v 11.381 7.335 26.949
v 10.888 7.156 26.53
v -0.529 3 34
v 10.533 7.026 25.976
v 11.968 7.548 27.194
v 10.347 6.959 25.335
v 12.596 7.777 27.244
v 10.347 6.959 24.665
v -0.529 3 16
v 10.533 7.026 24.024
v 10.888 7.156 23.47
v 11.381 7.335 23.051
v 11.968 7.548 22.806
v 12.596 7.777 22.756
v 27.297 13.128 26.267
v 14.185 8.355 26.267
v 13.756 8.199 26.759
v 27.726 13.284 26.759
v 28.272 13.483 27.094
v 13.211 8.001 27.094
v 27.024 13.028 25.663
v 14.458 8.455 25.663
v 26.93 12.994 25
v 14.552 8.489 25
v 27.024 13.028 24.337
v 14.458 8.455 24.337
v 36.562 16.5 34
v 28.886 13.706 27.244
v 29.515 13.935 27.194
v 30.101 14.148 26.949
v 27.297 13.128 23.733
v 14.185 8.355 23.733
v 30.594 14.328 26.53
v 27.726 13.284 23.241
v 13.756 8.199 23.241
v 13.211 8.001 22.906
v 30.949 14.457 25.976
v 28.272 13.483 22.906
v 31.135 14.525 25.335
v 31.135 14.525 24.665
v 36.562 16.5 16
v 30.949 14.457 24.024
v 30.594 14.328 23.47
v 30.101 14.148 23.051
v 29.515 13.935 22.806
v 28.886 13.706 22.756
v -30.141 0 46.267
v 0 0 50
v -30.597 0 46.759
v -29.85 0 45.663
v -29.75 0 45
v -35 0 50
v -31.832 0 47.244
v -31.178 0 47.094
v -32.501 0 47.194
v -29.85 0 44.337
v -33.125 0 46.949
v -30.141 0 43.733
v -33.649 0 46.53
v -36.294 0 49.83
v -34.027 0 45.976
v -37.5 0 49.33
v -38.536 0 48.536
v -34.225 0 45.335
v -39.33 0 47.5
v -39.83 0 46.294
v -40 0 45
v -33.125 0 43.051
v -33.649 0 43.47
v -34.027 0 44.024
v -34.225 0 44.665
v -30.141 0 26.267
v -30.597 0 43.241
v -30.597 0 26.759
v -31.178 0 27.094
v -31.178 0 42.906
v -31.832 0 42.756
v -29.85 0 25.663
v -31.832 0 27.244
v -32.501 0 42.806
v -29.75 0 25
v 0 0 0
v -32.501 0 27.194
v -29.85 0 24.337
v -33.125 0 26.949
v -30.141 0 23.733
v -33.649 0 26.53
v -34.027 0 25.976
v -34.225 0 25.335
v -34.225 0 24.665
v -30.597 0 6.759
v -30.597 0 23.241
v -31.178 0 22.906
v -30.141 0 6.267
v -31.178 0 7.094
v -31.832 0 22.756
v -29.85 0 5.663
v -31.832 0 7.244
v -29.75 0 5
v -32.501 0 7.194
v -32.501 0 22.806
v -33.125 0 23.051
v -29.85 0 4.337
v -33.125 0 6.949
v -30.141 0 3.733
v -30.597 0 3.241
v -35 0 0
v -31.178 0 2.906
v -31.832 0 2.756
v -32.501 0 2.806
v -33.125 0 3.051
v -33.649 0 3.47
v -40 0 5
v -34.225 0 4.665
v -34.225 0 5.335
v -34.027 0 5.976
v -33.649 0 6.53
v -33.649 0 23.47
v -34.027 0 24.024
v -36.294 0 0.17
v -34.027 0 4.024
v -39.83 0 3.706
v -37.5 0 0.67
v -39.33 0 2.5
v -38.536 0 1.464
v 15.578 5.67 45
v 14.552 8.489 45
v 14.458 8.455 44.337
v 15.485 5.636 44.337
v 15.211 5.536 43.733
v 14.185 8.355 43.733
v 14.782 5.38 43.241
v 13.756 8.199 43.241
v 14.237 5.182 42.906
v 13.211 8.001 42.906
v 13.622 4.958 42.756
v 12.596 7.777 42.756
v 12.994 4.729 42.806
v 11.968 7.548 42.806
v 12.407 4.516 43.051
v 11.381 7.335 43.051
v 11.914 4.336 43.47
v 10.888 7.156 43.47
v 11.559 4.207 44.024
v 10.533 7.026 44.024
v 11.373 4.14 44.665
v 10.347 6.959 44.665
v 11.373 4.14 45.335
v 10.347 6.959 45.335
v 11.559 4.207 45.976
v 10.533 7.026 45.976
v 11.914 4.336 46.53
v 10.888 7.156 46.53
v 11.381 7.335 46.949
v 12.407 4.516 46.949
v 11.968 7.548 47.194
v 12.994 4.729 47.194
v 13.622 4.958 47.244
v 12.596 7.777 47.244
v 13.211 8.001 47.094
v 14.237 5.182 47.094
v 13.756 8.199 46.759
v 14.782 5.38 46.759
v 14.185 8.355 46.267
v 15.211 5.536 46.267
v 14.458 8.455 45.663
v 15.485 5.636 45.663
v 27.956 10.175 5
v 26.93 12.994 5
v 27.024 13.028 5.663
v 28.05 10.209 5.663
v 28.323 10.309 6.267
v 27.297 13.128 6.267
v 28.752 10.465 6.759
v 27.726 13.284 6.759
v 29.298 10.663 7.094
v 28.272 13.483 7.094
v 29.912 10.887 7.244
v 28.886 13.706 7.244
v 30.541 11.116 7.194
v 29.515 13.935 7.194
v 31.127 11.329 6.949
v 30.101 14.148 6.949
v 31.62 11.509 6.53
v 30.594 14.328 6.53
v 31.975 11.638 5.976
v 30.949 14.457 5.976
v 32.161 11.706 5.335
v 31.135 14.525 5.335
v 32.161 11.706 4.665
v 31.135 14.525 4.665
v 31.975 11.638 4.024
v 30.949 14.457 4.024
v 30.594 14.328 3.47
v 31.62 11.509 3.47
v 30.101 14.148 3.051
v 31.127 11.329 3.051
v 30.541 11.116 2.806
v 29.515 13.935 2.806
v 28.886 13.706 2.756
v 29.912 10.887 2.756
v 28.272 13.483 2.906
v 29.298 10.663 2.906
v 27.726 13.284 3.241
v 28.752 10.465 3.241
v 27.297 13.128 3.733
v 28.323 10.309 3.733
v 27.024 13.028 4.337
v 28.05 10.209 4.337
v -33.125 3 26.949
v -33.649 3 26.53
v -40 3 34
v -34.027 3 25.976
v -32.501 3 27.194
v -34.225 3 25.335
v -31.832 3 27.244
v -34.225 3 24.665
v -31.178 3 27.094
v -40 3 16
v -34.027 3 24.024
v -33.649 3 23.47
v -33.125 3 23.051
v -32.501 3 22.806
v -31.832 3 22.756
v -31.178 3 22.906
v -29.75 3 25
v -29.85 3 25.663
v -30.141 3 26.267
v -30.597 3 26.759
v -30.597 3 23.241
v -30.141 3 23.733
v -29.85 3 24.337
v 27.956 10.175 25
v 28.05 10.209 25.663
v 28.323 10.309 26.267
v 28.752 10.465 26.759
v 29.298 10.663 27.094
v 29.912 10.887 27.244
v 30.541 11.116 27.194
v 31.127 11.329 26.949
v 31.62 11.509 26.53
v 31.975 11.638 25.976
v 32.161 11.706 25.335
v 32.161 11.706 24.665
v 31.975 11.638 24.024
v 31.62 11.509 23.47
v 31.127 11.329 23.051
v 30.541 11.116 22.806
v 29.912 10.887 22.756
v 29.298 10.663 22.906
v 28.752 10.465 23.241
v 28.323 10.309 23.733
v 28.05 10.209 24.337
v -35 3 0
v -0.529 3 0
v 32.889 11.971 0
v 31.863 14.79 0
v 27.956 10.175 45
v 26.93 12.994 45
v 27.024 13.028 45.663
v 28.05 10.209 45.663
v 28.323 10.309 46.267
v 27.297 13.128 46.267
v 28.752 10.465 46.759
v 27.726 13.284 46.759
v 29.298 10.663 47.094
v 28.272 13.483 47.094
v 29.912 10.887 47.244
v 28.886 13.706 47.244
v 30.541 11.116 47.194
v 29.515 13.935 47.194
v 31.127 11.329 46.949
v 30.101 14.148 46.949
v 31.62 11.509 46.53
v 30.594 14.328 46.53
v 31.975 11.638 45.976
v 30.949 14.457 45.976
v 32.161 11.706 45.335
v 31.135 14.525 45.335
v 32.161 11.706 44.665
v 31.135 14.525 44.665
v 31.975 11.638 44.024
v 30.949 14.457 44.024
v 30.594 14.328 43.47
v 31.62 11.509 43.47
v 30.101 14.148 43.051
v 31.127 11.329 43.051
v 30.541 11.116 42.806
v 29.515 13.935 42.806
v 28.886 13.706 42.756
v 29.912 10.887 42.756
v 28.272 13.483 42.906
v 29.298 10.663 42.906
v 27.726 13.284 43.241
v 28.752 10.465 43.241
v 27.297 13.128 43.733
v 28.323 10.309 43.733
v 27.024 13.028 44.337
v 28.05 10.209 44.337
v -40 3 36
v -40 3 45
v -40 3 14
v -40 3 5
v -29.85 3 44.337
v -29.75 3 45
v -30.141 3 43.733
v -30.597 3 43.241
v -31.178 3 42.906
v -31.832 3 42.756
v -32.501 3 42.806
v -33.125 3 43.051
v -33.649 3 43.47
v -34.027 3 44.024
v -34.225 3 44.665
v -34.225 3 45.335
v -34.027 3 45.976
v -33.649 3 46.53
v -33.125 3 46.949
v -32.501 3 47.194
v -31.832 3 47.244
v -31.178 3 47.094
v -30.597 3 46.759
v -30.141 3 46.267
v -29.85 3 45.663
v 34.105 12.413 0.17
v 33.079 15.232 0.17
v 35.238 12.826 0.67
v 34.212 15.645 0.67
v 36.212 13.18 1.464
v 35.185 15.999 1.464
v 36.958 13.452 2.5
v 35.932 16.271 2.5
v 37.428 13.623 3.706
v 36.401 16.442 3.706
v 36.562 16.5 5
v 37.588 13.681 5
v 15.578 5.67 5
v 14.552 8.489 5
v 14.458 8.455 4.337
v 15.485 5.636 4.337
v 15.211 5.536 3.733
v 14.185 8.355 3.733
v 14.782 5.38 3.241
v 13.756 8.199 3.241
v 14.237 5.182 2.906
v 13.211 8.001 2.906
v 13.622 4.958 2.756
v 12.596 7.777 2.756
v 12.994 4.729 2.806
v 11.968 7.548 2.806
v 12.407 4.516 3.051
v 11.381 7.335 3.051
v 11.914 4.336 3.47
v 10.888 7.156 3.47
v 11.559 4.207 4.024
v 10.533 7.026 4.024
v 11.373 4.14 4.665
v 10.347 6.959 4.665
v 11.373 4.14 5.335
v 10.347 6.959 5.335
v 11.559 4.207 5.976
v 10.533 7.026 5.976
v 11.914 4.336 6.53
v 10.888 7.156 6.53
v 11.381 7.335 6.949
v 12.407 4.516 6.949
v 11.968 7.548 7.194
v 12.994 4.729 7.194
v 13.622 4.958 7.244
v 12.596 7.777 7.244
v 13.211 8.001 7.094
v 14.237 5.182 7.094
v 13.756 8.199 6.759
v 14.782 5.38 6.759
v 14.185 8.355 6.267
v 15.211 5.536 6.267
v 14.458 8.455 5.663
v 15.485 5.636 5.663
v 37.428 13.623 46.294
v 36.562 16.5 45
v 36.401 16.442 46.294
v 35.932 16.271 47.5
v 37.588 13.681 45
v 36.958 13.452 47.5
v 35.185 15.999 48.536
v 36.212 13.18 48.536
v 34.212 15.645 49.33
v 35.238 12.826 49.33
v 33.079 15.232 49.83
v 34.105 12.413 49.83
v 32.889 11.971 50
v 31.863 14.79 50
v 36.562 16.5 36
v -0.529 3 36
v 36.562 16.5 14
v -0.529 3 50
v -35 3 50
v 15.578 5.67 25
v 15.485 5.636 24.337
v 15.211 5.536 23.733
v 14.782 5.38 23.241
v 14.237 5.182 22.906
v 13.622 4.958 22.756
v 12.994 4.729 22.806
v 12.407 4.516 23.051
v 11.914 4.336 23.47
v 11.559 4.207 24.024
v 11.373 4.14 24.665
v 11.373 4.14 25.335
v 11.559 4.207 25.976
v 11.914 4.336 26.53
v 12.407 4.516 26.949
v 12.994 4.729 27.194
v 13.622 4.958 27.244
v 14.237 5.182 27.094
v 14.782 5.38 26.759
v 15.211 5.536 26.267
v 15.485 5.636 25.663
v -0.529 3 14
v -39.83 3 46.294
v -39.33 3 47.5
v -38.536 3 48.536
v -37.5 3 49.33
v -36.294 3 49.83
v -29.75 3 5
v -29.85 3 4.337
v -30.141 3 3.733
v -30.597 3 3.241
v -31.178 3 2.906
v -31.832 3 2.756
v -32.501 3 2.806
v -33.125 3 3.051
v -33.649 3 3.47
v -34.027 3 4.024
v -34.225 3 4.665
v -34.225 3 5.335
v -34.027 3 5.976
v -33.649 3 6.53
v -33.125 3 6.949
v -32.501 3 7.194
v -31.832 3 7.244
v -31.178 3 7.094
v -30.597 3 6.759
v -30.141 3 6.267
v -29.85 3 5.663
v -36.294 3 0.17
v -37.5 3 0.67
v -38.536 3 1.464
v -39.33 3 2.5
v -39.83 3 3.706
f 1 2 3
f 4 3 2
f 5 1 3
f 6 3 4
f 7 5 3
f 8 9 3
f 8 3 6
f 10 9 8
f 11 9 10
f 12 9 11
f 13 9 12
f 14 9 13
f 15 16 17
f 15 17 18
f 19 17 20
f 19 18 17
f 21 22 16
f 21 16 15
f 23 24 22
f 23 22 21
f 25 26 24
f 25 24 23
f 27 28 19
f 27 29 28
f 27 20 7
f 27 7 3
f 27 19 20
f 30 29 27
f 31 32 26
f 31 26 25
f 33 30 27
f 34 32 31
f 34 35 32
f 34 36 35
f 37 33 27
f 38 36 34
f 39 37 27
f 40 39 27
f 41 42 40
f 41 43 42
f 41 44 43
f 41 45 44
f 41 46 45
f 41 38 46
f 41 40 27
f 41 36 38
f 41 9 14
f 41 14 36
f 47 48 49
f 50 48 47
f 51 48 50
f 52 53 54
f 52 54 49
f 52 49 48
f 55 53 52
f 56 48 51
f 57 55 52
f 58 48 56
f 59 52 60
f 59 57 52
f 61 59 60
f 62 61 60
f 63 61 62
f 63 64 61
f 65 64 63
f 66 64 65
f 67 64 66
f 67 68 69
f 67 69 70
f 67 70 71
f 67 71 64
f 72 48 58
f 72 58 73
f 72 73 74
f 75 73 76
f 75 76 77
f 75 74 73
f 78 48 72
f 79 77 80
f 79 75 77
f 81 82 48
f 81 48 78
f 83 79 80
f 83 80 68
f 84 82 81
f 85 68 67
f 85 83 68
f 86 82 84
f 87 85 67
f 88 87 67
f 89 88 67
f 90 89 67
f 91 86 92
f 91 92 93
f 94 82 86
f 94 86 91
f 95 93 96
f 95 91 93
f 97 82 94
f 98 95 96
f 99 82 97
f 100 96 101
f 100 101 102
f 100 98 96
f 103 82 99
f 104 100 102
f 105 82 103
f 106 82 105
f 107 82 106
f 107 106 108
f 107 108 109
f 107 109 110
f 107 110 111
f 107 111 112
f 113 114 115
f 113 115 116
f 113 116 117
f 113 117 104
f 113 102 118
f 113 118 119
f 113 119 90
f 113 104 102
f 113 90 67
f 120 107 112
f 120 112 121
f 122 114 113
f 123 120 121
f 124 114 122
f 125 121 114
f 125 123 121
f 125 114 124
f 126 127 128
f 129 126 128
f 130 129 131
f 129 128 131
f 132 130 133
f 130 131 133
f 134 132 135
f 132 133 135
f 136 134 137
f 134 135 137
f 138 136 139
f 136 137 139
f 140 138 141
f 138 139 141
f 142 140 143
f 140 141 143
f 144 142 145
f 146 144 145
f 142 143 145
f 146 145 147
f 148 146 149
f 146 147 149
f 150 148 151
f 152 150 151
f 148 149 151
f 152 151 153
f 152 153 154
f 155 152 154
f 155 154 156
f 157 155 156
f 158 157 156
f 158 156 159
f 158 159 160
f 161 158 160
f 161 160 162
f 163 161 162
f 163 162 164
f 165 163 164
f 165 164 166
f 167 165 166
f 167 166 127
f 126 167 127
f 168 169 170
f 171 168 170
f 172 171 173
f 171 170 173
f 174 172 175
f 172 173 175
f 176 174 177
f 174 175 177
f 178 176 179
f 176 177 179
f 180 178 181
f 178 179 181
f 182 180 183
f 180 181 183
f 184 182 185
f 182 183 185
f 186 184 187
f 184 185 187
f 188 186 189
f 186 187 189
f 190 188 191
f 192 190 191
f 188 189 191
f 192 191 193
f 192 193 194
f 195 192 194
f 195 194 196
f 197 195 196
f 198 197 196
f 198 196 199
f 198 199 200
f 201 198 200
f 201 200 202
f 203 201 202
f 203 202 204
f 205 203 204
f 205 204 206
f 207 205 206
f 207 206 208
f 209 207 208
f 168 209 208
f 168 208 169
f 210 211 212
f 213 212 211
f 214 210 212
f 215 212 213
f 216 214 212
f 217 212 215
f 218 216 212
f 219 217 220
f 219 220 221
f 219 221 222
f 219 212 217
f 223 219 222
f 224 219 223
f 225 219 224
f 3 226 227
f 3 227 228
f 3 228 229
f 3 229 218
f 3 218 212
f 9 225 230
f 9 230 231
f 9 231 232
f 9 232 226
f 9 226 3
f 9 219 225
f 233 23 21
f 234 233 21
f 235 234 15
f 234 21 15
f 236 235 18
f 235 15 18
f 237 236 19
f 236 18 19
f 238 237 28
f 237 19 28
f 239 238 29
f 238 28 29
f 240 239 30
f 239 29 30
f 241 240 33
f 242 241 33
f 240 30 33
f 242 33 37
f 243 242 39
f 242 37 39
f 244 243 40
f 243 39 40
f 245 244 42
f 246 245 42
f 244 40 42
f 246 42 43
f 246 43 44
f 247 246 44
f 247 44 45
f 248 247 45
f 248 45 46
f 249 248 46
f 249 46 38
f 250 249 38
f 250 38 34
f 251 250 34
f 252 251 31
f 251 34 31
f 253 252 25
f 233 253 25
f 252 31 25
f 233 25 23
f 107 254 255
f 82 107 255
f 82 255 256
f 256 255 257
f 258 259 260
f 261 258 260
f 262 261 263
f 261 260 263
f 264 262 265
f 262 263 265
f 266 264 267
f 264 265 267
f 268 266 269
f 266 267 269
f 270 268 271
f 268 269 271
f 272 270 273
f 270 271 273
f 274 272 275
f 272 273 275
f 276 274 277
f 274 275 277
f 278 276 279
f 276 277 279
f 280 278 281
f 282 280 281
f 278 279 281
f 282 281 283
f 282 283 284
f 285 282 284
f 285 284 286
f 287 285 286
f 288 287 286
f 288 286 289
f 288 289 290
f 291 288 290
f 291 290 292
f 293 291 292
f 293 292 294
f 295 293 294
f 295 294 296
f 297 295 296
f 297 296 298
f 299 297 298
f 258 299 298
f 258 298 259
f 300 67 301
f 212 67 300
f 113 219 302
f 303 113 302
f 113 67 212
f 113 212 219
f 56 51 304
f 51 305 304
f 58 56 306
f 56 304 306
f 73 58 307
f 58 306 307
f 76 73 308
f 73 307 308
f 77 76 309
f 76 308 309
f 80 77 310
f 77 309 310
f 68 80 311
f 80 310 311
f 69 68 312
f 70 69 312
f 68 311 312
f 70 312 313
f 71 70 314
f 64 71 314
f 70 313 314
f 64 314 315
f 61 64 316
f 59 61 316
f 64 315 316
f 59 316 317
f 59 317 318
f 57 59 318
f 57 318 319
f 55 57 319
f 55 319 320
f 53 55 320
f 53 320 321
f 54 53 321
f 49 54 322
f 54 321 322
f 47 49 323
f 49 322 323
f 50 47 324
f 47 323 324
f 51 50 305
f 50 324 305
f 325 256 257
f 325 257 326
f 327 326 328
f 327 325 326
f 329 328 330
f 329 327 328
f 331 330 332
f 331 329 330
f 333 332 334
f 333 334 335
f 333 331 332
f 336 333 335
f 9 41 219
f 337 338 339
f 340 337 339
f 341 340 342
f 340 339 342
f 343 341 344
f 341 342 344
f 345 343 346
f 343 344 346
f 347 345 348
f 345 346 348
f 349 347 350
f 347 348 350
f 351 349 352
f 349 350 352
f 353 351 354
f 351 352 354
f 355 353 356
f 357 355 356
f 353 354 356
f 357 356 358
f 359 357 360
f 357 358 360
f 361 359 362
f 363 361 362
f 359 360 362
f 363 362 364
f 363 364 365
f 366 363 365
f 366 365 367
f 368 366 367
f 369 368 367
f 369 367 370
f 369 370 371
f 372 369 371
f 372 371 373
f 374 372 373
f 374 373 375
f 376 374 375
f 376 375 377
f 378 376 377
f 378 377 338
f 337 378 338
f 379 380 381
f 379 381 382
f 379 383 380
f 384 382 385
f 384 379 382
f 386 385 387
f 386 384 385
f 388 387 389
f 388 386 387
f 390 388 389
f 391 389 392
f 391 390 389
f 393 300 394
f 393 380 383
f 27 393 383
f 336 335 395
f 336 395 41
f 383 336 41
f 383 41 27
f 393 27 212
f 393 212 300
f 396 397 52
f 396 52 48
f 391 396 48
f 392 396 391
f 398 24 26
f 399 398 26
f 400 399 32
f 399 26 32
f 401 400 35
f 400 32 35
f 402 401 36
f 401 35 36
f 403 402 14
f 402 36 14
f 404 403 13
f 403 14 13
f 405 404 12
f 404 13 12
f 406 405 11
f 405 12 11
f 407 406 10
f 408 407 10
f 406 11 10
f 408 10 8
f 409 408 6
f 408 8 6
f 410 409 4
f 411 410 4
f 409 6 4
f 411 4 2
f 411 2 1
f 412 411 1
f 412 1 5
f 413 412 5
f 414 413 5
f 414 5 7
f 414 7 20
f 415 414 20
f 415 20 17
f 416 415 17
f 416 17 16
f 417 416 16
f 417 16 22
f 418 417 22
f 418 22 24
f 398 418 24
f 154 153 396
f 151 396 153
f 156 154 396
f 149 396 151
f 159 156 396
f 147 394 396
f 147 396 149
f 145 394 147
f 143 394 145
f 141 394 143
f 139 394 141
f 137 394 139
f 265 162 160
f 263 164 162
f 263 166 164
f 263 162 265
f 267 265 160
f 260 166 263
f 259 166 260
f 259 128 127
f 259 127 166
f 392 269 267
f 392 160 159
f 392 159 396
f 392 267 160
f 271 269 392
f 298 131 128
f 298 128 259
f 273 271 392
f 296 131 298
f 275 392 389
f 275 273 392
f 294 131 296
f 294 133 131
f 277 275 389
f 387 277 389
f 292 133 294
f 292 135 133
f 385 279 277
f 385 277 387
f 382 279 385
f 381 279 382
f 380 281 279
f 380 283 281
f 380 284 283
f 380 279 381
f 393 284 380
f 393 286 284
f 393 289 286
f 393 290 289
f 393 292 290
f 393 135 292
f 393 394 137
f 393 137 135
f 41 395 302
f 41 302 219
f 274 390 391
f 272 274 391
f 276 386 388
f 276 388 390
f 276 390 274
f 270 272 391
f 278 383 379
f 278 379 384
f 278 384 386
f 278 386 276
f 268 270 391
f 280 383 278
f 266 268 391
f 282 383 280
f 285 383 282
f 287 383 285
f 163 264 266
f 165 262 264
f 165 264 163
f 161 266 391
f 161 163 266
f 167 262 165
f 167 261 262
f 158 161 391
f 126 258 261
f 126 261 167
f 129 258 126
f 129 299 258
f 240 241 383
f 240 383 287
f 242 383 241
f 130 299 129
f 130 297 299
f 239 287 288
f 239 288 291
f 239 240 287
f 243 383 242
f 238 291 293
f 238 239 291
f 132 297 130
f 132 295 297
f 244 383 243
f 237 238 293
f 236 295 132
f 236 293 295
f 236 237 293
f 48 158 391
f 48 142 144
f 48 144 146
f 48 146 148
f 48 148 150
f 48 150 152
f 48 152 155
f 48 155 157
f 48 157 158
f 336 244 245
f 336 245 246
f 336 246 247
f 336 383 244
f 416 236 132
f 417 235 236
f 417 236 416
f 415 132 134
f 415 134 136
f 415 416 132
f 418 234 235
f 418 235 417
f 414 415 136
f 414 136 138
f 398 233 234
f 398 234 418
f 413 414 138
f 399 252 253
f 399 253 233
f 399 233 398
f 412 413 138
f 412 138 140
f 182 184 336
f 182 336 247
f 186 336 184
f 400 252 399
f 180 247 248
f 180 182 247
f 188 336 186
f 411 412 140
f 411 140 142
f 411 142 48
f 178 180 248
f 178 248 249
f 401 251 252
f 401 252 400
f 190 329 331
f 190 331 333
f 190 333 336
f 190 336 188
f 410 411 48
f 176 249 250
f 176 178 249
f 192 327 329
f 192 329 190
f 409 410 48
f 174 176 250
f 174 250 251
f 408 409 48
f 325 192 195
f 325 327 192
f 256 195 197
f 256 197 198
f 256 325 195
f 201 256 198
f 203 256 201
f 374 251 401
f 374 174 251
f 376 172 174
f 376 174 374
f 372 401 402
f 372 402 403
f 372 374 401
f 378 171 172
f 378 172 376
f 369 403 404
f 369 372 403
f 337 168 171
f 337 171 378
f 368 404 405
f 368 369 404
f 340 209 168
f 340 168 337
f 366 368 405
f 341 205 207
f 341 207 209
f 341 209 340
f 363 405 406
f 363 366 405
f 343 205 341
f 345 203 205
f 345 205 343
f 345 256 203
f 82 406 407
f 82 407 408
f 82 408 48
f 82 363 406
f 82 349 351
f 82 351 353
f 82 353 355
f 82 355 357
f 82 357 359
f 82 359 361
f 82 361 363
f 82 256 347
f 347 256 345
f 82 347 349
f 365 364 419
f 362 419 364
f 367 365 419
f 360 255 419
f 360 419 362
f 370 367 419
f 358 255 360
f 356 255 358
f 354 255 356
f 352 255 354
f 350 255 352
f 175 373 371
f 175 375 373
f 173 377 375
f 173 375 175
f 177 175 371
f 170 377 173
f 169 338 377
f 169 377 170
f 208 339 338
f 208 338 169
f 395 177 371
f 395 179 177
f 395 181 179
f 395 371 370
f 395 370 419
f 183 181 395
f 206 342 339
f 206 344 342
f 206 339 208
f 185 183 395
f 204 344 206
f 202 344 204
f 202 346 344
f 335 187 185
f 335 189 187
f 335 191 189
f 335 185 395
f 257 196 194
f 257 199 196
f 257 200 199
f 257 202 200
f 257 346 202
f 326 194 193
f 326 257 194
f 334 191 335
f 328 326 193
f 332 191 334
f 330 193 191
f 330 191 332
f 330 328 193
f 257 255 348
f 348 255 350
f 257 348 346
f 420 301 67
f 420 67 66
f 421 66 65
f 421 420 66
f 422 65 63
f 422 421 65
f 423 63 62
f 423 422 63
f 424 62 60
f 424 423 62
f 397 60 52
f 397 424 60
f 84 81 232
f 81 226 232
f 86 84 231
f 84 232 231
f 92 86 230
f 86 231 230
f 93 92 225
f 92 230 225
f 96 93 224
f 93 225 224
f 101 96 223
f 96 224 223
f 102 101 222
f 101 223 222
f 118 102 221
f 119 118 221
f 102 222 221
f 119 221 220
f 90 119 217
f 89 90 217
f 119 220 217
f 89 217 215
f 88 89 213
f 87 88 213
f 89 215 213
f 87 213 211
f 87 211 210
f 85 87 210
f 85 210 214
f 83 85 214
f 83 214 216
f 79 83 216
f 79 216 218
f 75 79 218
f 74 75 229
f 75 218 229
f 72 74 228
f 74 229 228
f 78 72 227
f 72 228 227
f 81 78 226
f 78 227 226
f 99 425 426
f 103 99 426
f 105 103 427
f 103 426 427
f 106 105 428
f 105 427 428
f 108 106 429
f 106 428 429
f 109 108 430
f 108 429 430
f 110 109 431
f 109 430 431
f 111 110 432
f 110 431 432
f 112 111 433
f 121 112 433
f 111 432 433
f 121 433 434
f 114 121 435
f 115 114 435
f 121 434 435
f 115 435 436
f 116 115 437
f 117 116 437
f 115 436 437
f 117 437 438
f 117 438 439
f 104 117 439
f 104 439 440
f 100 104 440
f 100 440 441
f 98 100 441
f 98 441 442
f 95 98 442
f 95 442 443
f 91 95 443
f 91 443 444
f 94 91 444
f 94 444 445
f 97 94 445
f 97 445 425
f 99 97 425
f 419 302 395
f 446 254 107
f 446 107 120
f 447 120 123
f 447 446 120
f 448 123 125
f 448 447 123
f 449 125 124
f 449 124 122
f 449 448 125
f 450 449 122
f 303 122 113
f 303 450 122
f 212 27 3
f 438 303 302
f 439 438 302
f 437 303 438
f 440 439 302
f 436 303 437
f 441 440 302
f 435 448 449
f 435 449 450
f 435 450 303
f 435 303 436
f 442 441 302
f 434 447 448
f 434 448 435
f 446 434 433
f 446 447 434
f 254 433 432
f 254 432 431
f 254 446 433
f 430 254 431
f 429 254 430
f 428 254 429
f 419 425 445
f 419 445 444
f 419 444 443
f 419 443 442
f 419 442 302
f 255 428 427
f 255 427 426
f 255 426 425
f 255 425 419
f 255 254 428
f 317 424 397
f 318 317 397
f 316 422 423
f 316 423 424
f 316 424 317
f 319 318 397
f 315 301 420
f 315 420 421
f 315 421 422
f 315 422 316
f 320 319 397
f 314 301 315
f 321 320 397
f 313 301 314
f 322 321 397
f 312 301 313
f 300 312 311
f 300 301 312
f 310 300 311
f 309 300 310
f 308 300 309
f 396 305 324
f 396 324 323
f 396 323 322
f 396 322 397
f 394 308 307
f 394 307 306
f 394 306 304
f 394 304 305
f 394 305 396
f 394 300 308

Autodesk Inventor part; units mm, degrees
ref_plane "YZ Plane" through (0, 0, 0) normal (1, 0, 0) x (0, 1, 0)
ref_plane "XZ Plane" through (0, 0, 0) normal (0, 1, 0) x (-1, 0, 0)
sketch "Sketch1" plane through (0, 0, 0) normal (0, 0, 1) x (1, 0, 0)
  line L0 (0, 0) -> (-40, 0)
  line L1 (-40, 0) -> (-40, 3)
  line L2 (-40, 3) -> (0, 3)
  line L3 (0, 3) -> (0, 0)
  line L4 (0, 0) -> (-1.0261, 2.8191)
  line L5 (-1.0261, 2.8191) -> (36.5616, 16.4999)
  line L6 (36.5616, 16.4999) -> (37.5877, 13.6808)
  line L7 (37.5877, 13.6808) -> (0, 0)
  point P0 (-0.529, 3)
  dimension "d0" = 160
  dimension "d1" = 3
  dimension "d2" = 3
  dimension "d3" = 40
  dimension "d4" = 40
extrude "Extrusion1" add sketch "Sketch1" along normal blind 50
sketch "Sketch2" plane through (-40, 3, 0) normal (0, 1, 0) x (1, 0, 0)
  line L0 (0, 0) -> (40, 0) projected
  line L1 (0, -50) -> (40, -50) projected
  circle A0 centre (8, -45) radius 2.25
  circle A1 centre (8, -25) radius 2.25
  circle A2 centre (8, -5) radius 2.25
  line L2 (8, 0) -> (8, -50)
  line L3 (0, 0) -> (0, -50) projected
  point P0 (8, -25)
  dimension "d7" = 4.5
  dimension "d8" = 4.5
  dimension "d9" = 4.5
  dimension "d10" = 20
  dimension "d12" = 8
  dimension "d13" = 20
extrude "Extrusion2" cut sketch "Sketch2" against normal blind 50 contours L2 A2 | A2 L2 | L2 A0 | A0 L2 | L2 A1 | A1 L2
ref_plane "Work Plane1" through (-0.529, 3, 0) normal (0.9848078, 0.1736482, 0) x (0, 0, -1)
mirror "Mirror1" about plane through (-0.529, 3, 0) normal (0.9848078, 0.1736482, 0) of "Extrusion2"
fillet "Fillet1" radius 5 4 edges at (37.0747, 15.0903, 0) (37.0747, 15.0903, 50) (-40, 1.5, 50) (-40, 1.5, 0)
sketch "Sketch3" plane through (-0.529, 3, 0) normal (0.9848078, 0.1736482, 0) x (0, 0, -1)
  line L0 (-5, 6.8541) -> (-45, 6.8541) projected
  ellipse E0 centre (-45, 5.4649) end of major axis (-47.25, 5.4649) minor radius 0.3907 projected
  ellipse E1 centre (-25, 5.4649) end of major axis (-27.25, 5.4649) minor radius 0.3907 projected
  ellipse E2 centre (-5, 5.4649) end of major axis (-7.25, 5.4649) minor radius 0.3907 projected
  line L1 (-25, 5.4649) -> (-25, 19.1248)
  line L2 (-45, 5.4649) -> (-25, 5.4649)
  line L3 (-36, -8.762) -> (-34, -8.762)
  line L4 (-34, -8.762) -> (-34, 19.6918)
  line L5 (-34, 19.6918) -> (-36, 19.6918)
  line L6 (-36, 19.6918) -> (-36, -8.762)
  line L7 (-36, -8.762) -> (-34, 19.6918) construction
  line L8 (-34, -8.762) -> (-36, 19.6918) construction
  ellipse E3 centre (-5, 5.9858) end of major axis (0, 5.9858) minor radius 0.8682 (0, 5.9858) -> (-5, 6.8541) ccw projected
  line L9 (-5, 6.8541) -> (-45, 6.8541) projected
  ellipse E4 centre (-45, 5.9858) end of major axis (-40, 5.9858) minor radius 0.8682 (-45, 6.8541) -> (-50, 5.9858) ccw projected
  line L10 (-50, 0) -> (-50, 5.9858) projected
  line L11 (0, 0) -> (-50, 0) projected
  line L12 (0, 0) -> (0, 5.9858) projected
  ellipse E5 centre (-45, 5.4649) end of major axis (-47.25, 5.4649) minor radius 0.3907 projected
  ellipse E6 centre (-25, 5.4649) end of major axis (-27.25, 5.4649) minor radius 0.3907 projected
  ellipse E7 centre (-5, 5.4649) end of major axis (-7.25, 5.4649) minor radius 0.3907 projected
  line L13 (-14, -8.762) -> (-16, -8.762)
  line L14 (-16, -8.762) -> (-16, 19.6918)
  line L15 (-16, 19.6918) -> (-14, 19.6918)
  line L16 (-14, 19.6918) -> (-14, -8.762)
  line L17 (-14, -8.762) -> (-16, 19.6918) construction
  line L18 (-16, -8.762) -> (-14, 19.6918) construction
  point P0 (0, -3.0463)
  point P1 (-35, 5.4649)
  point P2 (-15, 5.4649)
  point P3 (-14, 0)
  point P4 (-14, 6.8541)
  point P5 (-16, 6.8541)
  point P6 (-16, 0)
  point P7 (-36, 0)
  point P8 (-34, 0)
  point P9 (-34, 6.8541)
  point P10 (-36, 6.8541)
  dimension "d17" = 2
extrude "Extrusion3" add sketch "Sketch3" against normal up to next contours L16 L11 L14 L0 | L4 L2 L6 L0 | L11 L6 L2 L4
mirror "Mirror2" about plane through (-0.529, 3, 0) normal (0.9848078, 0.1736482, 0) of "Extrusion3"
sketch "Sketch4" plane through (-0.529, 3, 34) normal (-0.3420201, 0.9396926, 0) x (0.9396926, 0.3420201, 0)
  circle A0 centre (13.7993, 29) radius 2.25
  circle A1 centre (13.7993, 9) radius 2.25
  circle A2 centre (13.7993, -11) radius 2.25
  point P0 (-0.529, 34)
extrude "Extrusion4" cut sketch "Sketch4" against normal blind 10
equation "\"d13\" = d10"
properties part number "Angle_3DPrint"
